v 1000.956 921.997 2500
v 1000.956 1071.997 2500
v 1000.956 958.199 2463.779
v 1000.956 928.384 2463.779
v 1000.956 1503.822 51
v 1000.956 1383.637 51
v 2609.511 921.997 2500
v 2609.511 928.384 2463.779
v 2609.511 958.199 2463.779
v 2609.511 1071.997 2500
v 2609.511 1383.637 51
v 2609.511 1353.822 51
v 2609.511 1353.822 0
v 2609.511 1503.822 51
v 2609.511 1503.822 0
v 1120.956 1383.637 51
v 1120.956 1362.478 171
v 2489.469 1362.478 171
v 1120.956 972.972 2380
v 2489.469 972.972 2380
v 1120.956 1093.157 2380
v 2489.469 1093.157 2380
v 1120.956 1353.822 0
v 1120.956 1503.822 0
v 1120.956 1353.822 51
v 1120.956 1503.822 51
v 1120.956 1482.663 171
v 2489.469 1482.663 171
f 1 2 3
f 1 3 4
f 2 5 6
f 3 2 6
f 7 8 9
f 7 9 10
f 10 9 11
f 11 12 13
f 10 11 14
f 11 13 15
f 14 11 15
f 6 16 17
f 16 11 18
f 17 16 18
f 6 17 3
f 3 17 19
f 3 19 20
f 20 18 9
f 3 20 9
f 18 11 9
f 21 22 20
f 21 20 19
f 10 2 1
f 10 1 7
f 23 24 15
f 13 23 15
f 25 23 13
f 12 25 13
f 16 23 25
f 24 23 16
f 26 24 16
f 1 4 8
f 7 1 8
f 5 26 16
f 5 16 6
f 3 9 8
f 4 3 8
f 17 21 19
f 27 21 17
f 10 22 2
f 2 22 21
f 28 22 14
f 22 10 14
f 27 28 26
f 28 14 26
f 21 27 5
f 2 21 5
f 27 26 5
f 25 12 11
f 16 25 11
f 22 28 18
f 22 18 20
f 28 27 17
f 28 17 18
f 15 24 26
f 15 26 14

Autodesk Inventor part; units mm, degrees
sketch "Sketch19" plane through (0, 0, 0) normal (0, 0, 1) x (1, 0, 0)
  line L0 (1200.9555, -1496.1779) -> (1200.9555, 1503.8221)
  line L1 (-4726.1559, 1503.8221) -> (4728.0669, 1503.8221)
  line L2 (4418.0669, -1496.1779) -> (4418.0669, 1503.8221)
  line L3 (1200.9555, 1503.8221) -> (4418.0669, 1503.8221)
  line L4 (1200.9555, 1503.8221) -> (1000.9555, 1503.8221)
  line L5 (1000.9555, 1503.8221) -> (1000.9555, -1496.1779)
  line L6 (2809.5112, 1503.8221) -> (2609.5112, 1503.8221)
  line L7 (2609.5112, 1503.8221) -> (2609.5112, -1496.1779)
  line L8 (2609.5112, -1496.1779) -> (2509.5112, -1496.1779)
  line L9 (2509.5112, -1496.1779) -> (2509.5112, 1503.8221)
  line L10 (1200.9555, -1496.1779) -> (1000.9555, -1496.1779)
  line L11 (1000.9555, 1503.8221) -> (1000.9555, 1353.8221)
  line L12 (1000.9555, 1353.8221) -> (2609.5112, 1353.8221)
  point P0 (0, 0)
  dimension "d29" = 200
  dimension "d30" = 200
  dimension "d31" = 100
  dimension "d32" = 150
ref_plane "Work Plane17" through (0, 0, 2500) normal (0, 0, 1) x (1, 0, 0)
sketch "Sketch20" plane through (0, 0, 2500) normal (0, 0, 1) x (1, 0, 0)
  line L0 (-4726.1559, 1503.8221) -> (4728.0669, 1503.8221) projected
  line L1 (1200.9555, -1496.1779) -> (1200.9555, 1503.8221) projected
  line L2 (1000.9555, 1503.8221) -> (1000.9555, -1496.1779) projected
  line L3 (2509.5112, -1496.1779) -> (2509.5112, 1503.8221) projected
  line L4 (2609.5112, 1503.8221) -> (2609.5112, -1496.1779) projected
  line L5 (1000.9555, 1353.8221) -> (2609.5112, 1353.8221) projected
  point P0 (0, 0)
extrude "Extrusion4" add sketch "Sketch19" along normal blind 51 contours L12 L5 L1 L0 | L0 L1 L9 L12 | L9 L1 L7 L12
ref_plane "Work Plane18" through (0, 0, 51) normal (0, 0, 1) x (1, 0, 0)
sketch "Sketch22" plane through (0, 0, 51) normal (0, 0, 1) x (1, 0, 0)
  line L0 (2609.5112, 1503.8221) -> (1000.9555, 1503.8221) projected
  line L1 (1000.9555, 1503.8221) -> (1000.9555, 1353.8221) projected
  line L2 (1000.9555, 1353.8221) -> (2609.5112, 1353.8221) projected
  line L3 (2609.5112, 1353.8221) -> (2609.5112, 1503.8221) projected
  line L4 (1000.9555, 1503.8221) -> (2609.5112, 1503.8221)
  line L5 (2609.5112, 1503.8221) -> (2609.5112, 1353.8221)
  line L6 (2609.5112, 1353.8221) -> (1000.9555, 1353.8221)
  line L7 (1000.9555, 1353.8221) -> (1000.9555, 1503.8221)
  point P0 (0, 0)
ref_plane "Work Plane19" through (1000.9555, 1503.8221, 51) normal (-1, 0, 0) x (0, -1, 0)
sketch "Sketch23" plane through (1000.9555, 1503.8221, 51) normal (-1, 0, 0) x (0, -1, 0)
  line L0 (150, 0) -> (0, 0) projected
  line L1 (0, 2449) -> (3000, 2449) projected
  line L2 (0, 0) -> (431.8248, 2449)
  line L3 (0, 0) -> (2486.7798, 0) construction
  line L4 (0, 0) -> (150, 0)
  line L5 (150, 0) -> (0, 0)
  line L6 (150, 0) -> (581.8248, 2449)
  line L7 (150, 0) -> (2636.7798, 0) construction
  line L8 (581.8248, 2449) -> (431.8248, 2449)
  point P0 (1503.8221, -51)
  point P1 (0, 2449)
  dimension "d37" = 80
  dimension "d38" = 80
sketch "Sketch24" plane through (0, 0, 2500) normal (0, 0, 1) x (1, 0, 0)
  line L0 (1000.9555, 1071.9973) -> (2609.5112, 1071.9973)
  line L1 (1000.9555, 921.9973) -> (2609.5112, 921.9973)
  line L2 (2609.5112, 1071.9973) -> (2609.5112, 921.9973)
  line L3 (1000.9555, 1071.9973) -> (1000.9555, 921.9973)
  point P0 (0, 0)
loft "Loft2" add profiles "Sketch24" section 2 edges at (2609.5112, 1428.8221, 51) (1805.2334, 1503.8221, 51) (1000.9555, 1428.8221, 51) (1805.2334, 1353.8221, 51)
sketch "Sketch25" plane through (2609.5112, 1353.8221, 0) normal (1, 0, 0) x (0, 0, -1)
  line L0 (0, 0) -> (0, 150) projected
  line L1 (0, 150) -> (-51, 150) projected
  line L2 (-2500, -281.8248) -> (-51, 150) projected
  line L3 (-2500, -281.8248) -> (-2500, -431.8248) projected
  line L4 (-2500, -431.8248) -> (-51, 0) projected
  line L5 (0, 0) -> (-51, 0) projected
  line L6 (-51, 0) -> (-51, 29.8153)
  line L7 (-51, 0) -> (-21.1847, 0) construction
  line L8 (-51, 29.8153) -> (-2463.779, -395.6227)
  line L9 (-2500, -431.8248) -> (-51, 0) projected
  line L10 (-51, 29.8153) -> (2399, 29.8153) construction
  line L11 (-2463.779, -395.6227) -> (-2463.779, -425.438)
  line L12 (-2463.779, -425.438) -> (-51, 0)
  point P0 (0, -1353.8221)
  point P1 (-2463.779, -425.438)
  point P2 (-51, 0)
  dimension "d43" = 90
  dimension "d44" = 2450
  dimension "d45" = 170
extrude "Extrusion5" cut sketch "Sketch25" against normal through all contours L4 L11 L8 L6
ref_plane "Work Plane20" through (4728.0669, 1503.8221, 51) normal (0, -1, 0) x (-1, 0, 0)
sketch "Sketch26" plane through (4728.0669, 1503.8221, 51) normal (0, -1, 0) x (-1, 0, 0)
  line L0 (2118.5557, 0) -> (3727.1114, 0) projected
  line L1 (3727.1114, -2449) -> (3727.1114, 0) projected
  line L2 (2118.5557, -2449) -> (2118.5557, 0) projected
  line L3 (3727.1114, -2449) -> (2118.5557, -2449) projected
  line L4 (2118.5557, -2449) -> (2238.5978, -2449)
  line L5 (2238.5978, -2449) -> (2238.5978, -2329)
  line L6 (2238.5978, -2329) -> (2118.5557, -2329)
  line L7 (2118.5557, -2329) -> (2118.5557, -2449)
  line L8 (3727.1114, 0) -> (3607.1114, 0)
  line L9 (3607.1114, 0) -> (3607.1114, -120)
  line L10 (3607.1114, -120) -> (3727.1114, -120)
  line L11 (3727.1114, -120) -> (3727.1114, 0)
  line L12 (3607.1114, -120) -> (2238.5978, -120)
  line L13 (2238.5978, -120) -> (2238.5978, -2329)
  line L14 (2238.5978, -2329) -> (3607.1114, -2329)
  line L15 (3607.1114, -2329) -> (3607.1114, -120)
  point P0 (4728.0669, 51)
  dimension "d49" = 120
  dimension "d50" = 120
  dimension "d51" = 120
extrude "Extrusion6" cut sketch "Sketch26" along normal through all contours L15 L14 L13 L12
sketch "Sketch27" plane through (1000.9555, 1503.8221, 0) normal (0, 1, 0) x (1, 0, 0)
  line L0 (1608.5557, 0) -> (0, 0) projected
  line L1 (0, 0) -> (120, 0)
  line L2 (120, 0) -> (120, -51)
  line L3 (0, 0) -> (0, -51) projected
  line L4 (1608.5557, -51) -> (0, -51) projected
  line L5 (0, 0) -> (0, -51)
  line L6 (0, -51) -> (120, -51)
  line L7 (120, -2380) -> (120, -171) projected
  line L8 (0, -2500) -> (0, -51) projected
  point P0 (-1000.9555, 0)
  dimension "d54" = 120
extrude "Extrusion7" cut sketch "Sketch27" against normal through all
properties part number "eave_frame_01" material "Wood (Maple)"
